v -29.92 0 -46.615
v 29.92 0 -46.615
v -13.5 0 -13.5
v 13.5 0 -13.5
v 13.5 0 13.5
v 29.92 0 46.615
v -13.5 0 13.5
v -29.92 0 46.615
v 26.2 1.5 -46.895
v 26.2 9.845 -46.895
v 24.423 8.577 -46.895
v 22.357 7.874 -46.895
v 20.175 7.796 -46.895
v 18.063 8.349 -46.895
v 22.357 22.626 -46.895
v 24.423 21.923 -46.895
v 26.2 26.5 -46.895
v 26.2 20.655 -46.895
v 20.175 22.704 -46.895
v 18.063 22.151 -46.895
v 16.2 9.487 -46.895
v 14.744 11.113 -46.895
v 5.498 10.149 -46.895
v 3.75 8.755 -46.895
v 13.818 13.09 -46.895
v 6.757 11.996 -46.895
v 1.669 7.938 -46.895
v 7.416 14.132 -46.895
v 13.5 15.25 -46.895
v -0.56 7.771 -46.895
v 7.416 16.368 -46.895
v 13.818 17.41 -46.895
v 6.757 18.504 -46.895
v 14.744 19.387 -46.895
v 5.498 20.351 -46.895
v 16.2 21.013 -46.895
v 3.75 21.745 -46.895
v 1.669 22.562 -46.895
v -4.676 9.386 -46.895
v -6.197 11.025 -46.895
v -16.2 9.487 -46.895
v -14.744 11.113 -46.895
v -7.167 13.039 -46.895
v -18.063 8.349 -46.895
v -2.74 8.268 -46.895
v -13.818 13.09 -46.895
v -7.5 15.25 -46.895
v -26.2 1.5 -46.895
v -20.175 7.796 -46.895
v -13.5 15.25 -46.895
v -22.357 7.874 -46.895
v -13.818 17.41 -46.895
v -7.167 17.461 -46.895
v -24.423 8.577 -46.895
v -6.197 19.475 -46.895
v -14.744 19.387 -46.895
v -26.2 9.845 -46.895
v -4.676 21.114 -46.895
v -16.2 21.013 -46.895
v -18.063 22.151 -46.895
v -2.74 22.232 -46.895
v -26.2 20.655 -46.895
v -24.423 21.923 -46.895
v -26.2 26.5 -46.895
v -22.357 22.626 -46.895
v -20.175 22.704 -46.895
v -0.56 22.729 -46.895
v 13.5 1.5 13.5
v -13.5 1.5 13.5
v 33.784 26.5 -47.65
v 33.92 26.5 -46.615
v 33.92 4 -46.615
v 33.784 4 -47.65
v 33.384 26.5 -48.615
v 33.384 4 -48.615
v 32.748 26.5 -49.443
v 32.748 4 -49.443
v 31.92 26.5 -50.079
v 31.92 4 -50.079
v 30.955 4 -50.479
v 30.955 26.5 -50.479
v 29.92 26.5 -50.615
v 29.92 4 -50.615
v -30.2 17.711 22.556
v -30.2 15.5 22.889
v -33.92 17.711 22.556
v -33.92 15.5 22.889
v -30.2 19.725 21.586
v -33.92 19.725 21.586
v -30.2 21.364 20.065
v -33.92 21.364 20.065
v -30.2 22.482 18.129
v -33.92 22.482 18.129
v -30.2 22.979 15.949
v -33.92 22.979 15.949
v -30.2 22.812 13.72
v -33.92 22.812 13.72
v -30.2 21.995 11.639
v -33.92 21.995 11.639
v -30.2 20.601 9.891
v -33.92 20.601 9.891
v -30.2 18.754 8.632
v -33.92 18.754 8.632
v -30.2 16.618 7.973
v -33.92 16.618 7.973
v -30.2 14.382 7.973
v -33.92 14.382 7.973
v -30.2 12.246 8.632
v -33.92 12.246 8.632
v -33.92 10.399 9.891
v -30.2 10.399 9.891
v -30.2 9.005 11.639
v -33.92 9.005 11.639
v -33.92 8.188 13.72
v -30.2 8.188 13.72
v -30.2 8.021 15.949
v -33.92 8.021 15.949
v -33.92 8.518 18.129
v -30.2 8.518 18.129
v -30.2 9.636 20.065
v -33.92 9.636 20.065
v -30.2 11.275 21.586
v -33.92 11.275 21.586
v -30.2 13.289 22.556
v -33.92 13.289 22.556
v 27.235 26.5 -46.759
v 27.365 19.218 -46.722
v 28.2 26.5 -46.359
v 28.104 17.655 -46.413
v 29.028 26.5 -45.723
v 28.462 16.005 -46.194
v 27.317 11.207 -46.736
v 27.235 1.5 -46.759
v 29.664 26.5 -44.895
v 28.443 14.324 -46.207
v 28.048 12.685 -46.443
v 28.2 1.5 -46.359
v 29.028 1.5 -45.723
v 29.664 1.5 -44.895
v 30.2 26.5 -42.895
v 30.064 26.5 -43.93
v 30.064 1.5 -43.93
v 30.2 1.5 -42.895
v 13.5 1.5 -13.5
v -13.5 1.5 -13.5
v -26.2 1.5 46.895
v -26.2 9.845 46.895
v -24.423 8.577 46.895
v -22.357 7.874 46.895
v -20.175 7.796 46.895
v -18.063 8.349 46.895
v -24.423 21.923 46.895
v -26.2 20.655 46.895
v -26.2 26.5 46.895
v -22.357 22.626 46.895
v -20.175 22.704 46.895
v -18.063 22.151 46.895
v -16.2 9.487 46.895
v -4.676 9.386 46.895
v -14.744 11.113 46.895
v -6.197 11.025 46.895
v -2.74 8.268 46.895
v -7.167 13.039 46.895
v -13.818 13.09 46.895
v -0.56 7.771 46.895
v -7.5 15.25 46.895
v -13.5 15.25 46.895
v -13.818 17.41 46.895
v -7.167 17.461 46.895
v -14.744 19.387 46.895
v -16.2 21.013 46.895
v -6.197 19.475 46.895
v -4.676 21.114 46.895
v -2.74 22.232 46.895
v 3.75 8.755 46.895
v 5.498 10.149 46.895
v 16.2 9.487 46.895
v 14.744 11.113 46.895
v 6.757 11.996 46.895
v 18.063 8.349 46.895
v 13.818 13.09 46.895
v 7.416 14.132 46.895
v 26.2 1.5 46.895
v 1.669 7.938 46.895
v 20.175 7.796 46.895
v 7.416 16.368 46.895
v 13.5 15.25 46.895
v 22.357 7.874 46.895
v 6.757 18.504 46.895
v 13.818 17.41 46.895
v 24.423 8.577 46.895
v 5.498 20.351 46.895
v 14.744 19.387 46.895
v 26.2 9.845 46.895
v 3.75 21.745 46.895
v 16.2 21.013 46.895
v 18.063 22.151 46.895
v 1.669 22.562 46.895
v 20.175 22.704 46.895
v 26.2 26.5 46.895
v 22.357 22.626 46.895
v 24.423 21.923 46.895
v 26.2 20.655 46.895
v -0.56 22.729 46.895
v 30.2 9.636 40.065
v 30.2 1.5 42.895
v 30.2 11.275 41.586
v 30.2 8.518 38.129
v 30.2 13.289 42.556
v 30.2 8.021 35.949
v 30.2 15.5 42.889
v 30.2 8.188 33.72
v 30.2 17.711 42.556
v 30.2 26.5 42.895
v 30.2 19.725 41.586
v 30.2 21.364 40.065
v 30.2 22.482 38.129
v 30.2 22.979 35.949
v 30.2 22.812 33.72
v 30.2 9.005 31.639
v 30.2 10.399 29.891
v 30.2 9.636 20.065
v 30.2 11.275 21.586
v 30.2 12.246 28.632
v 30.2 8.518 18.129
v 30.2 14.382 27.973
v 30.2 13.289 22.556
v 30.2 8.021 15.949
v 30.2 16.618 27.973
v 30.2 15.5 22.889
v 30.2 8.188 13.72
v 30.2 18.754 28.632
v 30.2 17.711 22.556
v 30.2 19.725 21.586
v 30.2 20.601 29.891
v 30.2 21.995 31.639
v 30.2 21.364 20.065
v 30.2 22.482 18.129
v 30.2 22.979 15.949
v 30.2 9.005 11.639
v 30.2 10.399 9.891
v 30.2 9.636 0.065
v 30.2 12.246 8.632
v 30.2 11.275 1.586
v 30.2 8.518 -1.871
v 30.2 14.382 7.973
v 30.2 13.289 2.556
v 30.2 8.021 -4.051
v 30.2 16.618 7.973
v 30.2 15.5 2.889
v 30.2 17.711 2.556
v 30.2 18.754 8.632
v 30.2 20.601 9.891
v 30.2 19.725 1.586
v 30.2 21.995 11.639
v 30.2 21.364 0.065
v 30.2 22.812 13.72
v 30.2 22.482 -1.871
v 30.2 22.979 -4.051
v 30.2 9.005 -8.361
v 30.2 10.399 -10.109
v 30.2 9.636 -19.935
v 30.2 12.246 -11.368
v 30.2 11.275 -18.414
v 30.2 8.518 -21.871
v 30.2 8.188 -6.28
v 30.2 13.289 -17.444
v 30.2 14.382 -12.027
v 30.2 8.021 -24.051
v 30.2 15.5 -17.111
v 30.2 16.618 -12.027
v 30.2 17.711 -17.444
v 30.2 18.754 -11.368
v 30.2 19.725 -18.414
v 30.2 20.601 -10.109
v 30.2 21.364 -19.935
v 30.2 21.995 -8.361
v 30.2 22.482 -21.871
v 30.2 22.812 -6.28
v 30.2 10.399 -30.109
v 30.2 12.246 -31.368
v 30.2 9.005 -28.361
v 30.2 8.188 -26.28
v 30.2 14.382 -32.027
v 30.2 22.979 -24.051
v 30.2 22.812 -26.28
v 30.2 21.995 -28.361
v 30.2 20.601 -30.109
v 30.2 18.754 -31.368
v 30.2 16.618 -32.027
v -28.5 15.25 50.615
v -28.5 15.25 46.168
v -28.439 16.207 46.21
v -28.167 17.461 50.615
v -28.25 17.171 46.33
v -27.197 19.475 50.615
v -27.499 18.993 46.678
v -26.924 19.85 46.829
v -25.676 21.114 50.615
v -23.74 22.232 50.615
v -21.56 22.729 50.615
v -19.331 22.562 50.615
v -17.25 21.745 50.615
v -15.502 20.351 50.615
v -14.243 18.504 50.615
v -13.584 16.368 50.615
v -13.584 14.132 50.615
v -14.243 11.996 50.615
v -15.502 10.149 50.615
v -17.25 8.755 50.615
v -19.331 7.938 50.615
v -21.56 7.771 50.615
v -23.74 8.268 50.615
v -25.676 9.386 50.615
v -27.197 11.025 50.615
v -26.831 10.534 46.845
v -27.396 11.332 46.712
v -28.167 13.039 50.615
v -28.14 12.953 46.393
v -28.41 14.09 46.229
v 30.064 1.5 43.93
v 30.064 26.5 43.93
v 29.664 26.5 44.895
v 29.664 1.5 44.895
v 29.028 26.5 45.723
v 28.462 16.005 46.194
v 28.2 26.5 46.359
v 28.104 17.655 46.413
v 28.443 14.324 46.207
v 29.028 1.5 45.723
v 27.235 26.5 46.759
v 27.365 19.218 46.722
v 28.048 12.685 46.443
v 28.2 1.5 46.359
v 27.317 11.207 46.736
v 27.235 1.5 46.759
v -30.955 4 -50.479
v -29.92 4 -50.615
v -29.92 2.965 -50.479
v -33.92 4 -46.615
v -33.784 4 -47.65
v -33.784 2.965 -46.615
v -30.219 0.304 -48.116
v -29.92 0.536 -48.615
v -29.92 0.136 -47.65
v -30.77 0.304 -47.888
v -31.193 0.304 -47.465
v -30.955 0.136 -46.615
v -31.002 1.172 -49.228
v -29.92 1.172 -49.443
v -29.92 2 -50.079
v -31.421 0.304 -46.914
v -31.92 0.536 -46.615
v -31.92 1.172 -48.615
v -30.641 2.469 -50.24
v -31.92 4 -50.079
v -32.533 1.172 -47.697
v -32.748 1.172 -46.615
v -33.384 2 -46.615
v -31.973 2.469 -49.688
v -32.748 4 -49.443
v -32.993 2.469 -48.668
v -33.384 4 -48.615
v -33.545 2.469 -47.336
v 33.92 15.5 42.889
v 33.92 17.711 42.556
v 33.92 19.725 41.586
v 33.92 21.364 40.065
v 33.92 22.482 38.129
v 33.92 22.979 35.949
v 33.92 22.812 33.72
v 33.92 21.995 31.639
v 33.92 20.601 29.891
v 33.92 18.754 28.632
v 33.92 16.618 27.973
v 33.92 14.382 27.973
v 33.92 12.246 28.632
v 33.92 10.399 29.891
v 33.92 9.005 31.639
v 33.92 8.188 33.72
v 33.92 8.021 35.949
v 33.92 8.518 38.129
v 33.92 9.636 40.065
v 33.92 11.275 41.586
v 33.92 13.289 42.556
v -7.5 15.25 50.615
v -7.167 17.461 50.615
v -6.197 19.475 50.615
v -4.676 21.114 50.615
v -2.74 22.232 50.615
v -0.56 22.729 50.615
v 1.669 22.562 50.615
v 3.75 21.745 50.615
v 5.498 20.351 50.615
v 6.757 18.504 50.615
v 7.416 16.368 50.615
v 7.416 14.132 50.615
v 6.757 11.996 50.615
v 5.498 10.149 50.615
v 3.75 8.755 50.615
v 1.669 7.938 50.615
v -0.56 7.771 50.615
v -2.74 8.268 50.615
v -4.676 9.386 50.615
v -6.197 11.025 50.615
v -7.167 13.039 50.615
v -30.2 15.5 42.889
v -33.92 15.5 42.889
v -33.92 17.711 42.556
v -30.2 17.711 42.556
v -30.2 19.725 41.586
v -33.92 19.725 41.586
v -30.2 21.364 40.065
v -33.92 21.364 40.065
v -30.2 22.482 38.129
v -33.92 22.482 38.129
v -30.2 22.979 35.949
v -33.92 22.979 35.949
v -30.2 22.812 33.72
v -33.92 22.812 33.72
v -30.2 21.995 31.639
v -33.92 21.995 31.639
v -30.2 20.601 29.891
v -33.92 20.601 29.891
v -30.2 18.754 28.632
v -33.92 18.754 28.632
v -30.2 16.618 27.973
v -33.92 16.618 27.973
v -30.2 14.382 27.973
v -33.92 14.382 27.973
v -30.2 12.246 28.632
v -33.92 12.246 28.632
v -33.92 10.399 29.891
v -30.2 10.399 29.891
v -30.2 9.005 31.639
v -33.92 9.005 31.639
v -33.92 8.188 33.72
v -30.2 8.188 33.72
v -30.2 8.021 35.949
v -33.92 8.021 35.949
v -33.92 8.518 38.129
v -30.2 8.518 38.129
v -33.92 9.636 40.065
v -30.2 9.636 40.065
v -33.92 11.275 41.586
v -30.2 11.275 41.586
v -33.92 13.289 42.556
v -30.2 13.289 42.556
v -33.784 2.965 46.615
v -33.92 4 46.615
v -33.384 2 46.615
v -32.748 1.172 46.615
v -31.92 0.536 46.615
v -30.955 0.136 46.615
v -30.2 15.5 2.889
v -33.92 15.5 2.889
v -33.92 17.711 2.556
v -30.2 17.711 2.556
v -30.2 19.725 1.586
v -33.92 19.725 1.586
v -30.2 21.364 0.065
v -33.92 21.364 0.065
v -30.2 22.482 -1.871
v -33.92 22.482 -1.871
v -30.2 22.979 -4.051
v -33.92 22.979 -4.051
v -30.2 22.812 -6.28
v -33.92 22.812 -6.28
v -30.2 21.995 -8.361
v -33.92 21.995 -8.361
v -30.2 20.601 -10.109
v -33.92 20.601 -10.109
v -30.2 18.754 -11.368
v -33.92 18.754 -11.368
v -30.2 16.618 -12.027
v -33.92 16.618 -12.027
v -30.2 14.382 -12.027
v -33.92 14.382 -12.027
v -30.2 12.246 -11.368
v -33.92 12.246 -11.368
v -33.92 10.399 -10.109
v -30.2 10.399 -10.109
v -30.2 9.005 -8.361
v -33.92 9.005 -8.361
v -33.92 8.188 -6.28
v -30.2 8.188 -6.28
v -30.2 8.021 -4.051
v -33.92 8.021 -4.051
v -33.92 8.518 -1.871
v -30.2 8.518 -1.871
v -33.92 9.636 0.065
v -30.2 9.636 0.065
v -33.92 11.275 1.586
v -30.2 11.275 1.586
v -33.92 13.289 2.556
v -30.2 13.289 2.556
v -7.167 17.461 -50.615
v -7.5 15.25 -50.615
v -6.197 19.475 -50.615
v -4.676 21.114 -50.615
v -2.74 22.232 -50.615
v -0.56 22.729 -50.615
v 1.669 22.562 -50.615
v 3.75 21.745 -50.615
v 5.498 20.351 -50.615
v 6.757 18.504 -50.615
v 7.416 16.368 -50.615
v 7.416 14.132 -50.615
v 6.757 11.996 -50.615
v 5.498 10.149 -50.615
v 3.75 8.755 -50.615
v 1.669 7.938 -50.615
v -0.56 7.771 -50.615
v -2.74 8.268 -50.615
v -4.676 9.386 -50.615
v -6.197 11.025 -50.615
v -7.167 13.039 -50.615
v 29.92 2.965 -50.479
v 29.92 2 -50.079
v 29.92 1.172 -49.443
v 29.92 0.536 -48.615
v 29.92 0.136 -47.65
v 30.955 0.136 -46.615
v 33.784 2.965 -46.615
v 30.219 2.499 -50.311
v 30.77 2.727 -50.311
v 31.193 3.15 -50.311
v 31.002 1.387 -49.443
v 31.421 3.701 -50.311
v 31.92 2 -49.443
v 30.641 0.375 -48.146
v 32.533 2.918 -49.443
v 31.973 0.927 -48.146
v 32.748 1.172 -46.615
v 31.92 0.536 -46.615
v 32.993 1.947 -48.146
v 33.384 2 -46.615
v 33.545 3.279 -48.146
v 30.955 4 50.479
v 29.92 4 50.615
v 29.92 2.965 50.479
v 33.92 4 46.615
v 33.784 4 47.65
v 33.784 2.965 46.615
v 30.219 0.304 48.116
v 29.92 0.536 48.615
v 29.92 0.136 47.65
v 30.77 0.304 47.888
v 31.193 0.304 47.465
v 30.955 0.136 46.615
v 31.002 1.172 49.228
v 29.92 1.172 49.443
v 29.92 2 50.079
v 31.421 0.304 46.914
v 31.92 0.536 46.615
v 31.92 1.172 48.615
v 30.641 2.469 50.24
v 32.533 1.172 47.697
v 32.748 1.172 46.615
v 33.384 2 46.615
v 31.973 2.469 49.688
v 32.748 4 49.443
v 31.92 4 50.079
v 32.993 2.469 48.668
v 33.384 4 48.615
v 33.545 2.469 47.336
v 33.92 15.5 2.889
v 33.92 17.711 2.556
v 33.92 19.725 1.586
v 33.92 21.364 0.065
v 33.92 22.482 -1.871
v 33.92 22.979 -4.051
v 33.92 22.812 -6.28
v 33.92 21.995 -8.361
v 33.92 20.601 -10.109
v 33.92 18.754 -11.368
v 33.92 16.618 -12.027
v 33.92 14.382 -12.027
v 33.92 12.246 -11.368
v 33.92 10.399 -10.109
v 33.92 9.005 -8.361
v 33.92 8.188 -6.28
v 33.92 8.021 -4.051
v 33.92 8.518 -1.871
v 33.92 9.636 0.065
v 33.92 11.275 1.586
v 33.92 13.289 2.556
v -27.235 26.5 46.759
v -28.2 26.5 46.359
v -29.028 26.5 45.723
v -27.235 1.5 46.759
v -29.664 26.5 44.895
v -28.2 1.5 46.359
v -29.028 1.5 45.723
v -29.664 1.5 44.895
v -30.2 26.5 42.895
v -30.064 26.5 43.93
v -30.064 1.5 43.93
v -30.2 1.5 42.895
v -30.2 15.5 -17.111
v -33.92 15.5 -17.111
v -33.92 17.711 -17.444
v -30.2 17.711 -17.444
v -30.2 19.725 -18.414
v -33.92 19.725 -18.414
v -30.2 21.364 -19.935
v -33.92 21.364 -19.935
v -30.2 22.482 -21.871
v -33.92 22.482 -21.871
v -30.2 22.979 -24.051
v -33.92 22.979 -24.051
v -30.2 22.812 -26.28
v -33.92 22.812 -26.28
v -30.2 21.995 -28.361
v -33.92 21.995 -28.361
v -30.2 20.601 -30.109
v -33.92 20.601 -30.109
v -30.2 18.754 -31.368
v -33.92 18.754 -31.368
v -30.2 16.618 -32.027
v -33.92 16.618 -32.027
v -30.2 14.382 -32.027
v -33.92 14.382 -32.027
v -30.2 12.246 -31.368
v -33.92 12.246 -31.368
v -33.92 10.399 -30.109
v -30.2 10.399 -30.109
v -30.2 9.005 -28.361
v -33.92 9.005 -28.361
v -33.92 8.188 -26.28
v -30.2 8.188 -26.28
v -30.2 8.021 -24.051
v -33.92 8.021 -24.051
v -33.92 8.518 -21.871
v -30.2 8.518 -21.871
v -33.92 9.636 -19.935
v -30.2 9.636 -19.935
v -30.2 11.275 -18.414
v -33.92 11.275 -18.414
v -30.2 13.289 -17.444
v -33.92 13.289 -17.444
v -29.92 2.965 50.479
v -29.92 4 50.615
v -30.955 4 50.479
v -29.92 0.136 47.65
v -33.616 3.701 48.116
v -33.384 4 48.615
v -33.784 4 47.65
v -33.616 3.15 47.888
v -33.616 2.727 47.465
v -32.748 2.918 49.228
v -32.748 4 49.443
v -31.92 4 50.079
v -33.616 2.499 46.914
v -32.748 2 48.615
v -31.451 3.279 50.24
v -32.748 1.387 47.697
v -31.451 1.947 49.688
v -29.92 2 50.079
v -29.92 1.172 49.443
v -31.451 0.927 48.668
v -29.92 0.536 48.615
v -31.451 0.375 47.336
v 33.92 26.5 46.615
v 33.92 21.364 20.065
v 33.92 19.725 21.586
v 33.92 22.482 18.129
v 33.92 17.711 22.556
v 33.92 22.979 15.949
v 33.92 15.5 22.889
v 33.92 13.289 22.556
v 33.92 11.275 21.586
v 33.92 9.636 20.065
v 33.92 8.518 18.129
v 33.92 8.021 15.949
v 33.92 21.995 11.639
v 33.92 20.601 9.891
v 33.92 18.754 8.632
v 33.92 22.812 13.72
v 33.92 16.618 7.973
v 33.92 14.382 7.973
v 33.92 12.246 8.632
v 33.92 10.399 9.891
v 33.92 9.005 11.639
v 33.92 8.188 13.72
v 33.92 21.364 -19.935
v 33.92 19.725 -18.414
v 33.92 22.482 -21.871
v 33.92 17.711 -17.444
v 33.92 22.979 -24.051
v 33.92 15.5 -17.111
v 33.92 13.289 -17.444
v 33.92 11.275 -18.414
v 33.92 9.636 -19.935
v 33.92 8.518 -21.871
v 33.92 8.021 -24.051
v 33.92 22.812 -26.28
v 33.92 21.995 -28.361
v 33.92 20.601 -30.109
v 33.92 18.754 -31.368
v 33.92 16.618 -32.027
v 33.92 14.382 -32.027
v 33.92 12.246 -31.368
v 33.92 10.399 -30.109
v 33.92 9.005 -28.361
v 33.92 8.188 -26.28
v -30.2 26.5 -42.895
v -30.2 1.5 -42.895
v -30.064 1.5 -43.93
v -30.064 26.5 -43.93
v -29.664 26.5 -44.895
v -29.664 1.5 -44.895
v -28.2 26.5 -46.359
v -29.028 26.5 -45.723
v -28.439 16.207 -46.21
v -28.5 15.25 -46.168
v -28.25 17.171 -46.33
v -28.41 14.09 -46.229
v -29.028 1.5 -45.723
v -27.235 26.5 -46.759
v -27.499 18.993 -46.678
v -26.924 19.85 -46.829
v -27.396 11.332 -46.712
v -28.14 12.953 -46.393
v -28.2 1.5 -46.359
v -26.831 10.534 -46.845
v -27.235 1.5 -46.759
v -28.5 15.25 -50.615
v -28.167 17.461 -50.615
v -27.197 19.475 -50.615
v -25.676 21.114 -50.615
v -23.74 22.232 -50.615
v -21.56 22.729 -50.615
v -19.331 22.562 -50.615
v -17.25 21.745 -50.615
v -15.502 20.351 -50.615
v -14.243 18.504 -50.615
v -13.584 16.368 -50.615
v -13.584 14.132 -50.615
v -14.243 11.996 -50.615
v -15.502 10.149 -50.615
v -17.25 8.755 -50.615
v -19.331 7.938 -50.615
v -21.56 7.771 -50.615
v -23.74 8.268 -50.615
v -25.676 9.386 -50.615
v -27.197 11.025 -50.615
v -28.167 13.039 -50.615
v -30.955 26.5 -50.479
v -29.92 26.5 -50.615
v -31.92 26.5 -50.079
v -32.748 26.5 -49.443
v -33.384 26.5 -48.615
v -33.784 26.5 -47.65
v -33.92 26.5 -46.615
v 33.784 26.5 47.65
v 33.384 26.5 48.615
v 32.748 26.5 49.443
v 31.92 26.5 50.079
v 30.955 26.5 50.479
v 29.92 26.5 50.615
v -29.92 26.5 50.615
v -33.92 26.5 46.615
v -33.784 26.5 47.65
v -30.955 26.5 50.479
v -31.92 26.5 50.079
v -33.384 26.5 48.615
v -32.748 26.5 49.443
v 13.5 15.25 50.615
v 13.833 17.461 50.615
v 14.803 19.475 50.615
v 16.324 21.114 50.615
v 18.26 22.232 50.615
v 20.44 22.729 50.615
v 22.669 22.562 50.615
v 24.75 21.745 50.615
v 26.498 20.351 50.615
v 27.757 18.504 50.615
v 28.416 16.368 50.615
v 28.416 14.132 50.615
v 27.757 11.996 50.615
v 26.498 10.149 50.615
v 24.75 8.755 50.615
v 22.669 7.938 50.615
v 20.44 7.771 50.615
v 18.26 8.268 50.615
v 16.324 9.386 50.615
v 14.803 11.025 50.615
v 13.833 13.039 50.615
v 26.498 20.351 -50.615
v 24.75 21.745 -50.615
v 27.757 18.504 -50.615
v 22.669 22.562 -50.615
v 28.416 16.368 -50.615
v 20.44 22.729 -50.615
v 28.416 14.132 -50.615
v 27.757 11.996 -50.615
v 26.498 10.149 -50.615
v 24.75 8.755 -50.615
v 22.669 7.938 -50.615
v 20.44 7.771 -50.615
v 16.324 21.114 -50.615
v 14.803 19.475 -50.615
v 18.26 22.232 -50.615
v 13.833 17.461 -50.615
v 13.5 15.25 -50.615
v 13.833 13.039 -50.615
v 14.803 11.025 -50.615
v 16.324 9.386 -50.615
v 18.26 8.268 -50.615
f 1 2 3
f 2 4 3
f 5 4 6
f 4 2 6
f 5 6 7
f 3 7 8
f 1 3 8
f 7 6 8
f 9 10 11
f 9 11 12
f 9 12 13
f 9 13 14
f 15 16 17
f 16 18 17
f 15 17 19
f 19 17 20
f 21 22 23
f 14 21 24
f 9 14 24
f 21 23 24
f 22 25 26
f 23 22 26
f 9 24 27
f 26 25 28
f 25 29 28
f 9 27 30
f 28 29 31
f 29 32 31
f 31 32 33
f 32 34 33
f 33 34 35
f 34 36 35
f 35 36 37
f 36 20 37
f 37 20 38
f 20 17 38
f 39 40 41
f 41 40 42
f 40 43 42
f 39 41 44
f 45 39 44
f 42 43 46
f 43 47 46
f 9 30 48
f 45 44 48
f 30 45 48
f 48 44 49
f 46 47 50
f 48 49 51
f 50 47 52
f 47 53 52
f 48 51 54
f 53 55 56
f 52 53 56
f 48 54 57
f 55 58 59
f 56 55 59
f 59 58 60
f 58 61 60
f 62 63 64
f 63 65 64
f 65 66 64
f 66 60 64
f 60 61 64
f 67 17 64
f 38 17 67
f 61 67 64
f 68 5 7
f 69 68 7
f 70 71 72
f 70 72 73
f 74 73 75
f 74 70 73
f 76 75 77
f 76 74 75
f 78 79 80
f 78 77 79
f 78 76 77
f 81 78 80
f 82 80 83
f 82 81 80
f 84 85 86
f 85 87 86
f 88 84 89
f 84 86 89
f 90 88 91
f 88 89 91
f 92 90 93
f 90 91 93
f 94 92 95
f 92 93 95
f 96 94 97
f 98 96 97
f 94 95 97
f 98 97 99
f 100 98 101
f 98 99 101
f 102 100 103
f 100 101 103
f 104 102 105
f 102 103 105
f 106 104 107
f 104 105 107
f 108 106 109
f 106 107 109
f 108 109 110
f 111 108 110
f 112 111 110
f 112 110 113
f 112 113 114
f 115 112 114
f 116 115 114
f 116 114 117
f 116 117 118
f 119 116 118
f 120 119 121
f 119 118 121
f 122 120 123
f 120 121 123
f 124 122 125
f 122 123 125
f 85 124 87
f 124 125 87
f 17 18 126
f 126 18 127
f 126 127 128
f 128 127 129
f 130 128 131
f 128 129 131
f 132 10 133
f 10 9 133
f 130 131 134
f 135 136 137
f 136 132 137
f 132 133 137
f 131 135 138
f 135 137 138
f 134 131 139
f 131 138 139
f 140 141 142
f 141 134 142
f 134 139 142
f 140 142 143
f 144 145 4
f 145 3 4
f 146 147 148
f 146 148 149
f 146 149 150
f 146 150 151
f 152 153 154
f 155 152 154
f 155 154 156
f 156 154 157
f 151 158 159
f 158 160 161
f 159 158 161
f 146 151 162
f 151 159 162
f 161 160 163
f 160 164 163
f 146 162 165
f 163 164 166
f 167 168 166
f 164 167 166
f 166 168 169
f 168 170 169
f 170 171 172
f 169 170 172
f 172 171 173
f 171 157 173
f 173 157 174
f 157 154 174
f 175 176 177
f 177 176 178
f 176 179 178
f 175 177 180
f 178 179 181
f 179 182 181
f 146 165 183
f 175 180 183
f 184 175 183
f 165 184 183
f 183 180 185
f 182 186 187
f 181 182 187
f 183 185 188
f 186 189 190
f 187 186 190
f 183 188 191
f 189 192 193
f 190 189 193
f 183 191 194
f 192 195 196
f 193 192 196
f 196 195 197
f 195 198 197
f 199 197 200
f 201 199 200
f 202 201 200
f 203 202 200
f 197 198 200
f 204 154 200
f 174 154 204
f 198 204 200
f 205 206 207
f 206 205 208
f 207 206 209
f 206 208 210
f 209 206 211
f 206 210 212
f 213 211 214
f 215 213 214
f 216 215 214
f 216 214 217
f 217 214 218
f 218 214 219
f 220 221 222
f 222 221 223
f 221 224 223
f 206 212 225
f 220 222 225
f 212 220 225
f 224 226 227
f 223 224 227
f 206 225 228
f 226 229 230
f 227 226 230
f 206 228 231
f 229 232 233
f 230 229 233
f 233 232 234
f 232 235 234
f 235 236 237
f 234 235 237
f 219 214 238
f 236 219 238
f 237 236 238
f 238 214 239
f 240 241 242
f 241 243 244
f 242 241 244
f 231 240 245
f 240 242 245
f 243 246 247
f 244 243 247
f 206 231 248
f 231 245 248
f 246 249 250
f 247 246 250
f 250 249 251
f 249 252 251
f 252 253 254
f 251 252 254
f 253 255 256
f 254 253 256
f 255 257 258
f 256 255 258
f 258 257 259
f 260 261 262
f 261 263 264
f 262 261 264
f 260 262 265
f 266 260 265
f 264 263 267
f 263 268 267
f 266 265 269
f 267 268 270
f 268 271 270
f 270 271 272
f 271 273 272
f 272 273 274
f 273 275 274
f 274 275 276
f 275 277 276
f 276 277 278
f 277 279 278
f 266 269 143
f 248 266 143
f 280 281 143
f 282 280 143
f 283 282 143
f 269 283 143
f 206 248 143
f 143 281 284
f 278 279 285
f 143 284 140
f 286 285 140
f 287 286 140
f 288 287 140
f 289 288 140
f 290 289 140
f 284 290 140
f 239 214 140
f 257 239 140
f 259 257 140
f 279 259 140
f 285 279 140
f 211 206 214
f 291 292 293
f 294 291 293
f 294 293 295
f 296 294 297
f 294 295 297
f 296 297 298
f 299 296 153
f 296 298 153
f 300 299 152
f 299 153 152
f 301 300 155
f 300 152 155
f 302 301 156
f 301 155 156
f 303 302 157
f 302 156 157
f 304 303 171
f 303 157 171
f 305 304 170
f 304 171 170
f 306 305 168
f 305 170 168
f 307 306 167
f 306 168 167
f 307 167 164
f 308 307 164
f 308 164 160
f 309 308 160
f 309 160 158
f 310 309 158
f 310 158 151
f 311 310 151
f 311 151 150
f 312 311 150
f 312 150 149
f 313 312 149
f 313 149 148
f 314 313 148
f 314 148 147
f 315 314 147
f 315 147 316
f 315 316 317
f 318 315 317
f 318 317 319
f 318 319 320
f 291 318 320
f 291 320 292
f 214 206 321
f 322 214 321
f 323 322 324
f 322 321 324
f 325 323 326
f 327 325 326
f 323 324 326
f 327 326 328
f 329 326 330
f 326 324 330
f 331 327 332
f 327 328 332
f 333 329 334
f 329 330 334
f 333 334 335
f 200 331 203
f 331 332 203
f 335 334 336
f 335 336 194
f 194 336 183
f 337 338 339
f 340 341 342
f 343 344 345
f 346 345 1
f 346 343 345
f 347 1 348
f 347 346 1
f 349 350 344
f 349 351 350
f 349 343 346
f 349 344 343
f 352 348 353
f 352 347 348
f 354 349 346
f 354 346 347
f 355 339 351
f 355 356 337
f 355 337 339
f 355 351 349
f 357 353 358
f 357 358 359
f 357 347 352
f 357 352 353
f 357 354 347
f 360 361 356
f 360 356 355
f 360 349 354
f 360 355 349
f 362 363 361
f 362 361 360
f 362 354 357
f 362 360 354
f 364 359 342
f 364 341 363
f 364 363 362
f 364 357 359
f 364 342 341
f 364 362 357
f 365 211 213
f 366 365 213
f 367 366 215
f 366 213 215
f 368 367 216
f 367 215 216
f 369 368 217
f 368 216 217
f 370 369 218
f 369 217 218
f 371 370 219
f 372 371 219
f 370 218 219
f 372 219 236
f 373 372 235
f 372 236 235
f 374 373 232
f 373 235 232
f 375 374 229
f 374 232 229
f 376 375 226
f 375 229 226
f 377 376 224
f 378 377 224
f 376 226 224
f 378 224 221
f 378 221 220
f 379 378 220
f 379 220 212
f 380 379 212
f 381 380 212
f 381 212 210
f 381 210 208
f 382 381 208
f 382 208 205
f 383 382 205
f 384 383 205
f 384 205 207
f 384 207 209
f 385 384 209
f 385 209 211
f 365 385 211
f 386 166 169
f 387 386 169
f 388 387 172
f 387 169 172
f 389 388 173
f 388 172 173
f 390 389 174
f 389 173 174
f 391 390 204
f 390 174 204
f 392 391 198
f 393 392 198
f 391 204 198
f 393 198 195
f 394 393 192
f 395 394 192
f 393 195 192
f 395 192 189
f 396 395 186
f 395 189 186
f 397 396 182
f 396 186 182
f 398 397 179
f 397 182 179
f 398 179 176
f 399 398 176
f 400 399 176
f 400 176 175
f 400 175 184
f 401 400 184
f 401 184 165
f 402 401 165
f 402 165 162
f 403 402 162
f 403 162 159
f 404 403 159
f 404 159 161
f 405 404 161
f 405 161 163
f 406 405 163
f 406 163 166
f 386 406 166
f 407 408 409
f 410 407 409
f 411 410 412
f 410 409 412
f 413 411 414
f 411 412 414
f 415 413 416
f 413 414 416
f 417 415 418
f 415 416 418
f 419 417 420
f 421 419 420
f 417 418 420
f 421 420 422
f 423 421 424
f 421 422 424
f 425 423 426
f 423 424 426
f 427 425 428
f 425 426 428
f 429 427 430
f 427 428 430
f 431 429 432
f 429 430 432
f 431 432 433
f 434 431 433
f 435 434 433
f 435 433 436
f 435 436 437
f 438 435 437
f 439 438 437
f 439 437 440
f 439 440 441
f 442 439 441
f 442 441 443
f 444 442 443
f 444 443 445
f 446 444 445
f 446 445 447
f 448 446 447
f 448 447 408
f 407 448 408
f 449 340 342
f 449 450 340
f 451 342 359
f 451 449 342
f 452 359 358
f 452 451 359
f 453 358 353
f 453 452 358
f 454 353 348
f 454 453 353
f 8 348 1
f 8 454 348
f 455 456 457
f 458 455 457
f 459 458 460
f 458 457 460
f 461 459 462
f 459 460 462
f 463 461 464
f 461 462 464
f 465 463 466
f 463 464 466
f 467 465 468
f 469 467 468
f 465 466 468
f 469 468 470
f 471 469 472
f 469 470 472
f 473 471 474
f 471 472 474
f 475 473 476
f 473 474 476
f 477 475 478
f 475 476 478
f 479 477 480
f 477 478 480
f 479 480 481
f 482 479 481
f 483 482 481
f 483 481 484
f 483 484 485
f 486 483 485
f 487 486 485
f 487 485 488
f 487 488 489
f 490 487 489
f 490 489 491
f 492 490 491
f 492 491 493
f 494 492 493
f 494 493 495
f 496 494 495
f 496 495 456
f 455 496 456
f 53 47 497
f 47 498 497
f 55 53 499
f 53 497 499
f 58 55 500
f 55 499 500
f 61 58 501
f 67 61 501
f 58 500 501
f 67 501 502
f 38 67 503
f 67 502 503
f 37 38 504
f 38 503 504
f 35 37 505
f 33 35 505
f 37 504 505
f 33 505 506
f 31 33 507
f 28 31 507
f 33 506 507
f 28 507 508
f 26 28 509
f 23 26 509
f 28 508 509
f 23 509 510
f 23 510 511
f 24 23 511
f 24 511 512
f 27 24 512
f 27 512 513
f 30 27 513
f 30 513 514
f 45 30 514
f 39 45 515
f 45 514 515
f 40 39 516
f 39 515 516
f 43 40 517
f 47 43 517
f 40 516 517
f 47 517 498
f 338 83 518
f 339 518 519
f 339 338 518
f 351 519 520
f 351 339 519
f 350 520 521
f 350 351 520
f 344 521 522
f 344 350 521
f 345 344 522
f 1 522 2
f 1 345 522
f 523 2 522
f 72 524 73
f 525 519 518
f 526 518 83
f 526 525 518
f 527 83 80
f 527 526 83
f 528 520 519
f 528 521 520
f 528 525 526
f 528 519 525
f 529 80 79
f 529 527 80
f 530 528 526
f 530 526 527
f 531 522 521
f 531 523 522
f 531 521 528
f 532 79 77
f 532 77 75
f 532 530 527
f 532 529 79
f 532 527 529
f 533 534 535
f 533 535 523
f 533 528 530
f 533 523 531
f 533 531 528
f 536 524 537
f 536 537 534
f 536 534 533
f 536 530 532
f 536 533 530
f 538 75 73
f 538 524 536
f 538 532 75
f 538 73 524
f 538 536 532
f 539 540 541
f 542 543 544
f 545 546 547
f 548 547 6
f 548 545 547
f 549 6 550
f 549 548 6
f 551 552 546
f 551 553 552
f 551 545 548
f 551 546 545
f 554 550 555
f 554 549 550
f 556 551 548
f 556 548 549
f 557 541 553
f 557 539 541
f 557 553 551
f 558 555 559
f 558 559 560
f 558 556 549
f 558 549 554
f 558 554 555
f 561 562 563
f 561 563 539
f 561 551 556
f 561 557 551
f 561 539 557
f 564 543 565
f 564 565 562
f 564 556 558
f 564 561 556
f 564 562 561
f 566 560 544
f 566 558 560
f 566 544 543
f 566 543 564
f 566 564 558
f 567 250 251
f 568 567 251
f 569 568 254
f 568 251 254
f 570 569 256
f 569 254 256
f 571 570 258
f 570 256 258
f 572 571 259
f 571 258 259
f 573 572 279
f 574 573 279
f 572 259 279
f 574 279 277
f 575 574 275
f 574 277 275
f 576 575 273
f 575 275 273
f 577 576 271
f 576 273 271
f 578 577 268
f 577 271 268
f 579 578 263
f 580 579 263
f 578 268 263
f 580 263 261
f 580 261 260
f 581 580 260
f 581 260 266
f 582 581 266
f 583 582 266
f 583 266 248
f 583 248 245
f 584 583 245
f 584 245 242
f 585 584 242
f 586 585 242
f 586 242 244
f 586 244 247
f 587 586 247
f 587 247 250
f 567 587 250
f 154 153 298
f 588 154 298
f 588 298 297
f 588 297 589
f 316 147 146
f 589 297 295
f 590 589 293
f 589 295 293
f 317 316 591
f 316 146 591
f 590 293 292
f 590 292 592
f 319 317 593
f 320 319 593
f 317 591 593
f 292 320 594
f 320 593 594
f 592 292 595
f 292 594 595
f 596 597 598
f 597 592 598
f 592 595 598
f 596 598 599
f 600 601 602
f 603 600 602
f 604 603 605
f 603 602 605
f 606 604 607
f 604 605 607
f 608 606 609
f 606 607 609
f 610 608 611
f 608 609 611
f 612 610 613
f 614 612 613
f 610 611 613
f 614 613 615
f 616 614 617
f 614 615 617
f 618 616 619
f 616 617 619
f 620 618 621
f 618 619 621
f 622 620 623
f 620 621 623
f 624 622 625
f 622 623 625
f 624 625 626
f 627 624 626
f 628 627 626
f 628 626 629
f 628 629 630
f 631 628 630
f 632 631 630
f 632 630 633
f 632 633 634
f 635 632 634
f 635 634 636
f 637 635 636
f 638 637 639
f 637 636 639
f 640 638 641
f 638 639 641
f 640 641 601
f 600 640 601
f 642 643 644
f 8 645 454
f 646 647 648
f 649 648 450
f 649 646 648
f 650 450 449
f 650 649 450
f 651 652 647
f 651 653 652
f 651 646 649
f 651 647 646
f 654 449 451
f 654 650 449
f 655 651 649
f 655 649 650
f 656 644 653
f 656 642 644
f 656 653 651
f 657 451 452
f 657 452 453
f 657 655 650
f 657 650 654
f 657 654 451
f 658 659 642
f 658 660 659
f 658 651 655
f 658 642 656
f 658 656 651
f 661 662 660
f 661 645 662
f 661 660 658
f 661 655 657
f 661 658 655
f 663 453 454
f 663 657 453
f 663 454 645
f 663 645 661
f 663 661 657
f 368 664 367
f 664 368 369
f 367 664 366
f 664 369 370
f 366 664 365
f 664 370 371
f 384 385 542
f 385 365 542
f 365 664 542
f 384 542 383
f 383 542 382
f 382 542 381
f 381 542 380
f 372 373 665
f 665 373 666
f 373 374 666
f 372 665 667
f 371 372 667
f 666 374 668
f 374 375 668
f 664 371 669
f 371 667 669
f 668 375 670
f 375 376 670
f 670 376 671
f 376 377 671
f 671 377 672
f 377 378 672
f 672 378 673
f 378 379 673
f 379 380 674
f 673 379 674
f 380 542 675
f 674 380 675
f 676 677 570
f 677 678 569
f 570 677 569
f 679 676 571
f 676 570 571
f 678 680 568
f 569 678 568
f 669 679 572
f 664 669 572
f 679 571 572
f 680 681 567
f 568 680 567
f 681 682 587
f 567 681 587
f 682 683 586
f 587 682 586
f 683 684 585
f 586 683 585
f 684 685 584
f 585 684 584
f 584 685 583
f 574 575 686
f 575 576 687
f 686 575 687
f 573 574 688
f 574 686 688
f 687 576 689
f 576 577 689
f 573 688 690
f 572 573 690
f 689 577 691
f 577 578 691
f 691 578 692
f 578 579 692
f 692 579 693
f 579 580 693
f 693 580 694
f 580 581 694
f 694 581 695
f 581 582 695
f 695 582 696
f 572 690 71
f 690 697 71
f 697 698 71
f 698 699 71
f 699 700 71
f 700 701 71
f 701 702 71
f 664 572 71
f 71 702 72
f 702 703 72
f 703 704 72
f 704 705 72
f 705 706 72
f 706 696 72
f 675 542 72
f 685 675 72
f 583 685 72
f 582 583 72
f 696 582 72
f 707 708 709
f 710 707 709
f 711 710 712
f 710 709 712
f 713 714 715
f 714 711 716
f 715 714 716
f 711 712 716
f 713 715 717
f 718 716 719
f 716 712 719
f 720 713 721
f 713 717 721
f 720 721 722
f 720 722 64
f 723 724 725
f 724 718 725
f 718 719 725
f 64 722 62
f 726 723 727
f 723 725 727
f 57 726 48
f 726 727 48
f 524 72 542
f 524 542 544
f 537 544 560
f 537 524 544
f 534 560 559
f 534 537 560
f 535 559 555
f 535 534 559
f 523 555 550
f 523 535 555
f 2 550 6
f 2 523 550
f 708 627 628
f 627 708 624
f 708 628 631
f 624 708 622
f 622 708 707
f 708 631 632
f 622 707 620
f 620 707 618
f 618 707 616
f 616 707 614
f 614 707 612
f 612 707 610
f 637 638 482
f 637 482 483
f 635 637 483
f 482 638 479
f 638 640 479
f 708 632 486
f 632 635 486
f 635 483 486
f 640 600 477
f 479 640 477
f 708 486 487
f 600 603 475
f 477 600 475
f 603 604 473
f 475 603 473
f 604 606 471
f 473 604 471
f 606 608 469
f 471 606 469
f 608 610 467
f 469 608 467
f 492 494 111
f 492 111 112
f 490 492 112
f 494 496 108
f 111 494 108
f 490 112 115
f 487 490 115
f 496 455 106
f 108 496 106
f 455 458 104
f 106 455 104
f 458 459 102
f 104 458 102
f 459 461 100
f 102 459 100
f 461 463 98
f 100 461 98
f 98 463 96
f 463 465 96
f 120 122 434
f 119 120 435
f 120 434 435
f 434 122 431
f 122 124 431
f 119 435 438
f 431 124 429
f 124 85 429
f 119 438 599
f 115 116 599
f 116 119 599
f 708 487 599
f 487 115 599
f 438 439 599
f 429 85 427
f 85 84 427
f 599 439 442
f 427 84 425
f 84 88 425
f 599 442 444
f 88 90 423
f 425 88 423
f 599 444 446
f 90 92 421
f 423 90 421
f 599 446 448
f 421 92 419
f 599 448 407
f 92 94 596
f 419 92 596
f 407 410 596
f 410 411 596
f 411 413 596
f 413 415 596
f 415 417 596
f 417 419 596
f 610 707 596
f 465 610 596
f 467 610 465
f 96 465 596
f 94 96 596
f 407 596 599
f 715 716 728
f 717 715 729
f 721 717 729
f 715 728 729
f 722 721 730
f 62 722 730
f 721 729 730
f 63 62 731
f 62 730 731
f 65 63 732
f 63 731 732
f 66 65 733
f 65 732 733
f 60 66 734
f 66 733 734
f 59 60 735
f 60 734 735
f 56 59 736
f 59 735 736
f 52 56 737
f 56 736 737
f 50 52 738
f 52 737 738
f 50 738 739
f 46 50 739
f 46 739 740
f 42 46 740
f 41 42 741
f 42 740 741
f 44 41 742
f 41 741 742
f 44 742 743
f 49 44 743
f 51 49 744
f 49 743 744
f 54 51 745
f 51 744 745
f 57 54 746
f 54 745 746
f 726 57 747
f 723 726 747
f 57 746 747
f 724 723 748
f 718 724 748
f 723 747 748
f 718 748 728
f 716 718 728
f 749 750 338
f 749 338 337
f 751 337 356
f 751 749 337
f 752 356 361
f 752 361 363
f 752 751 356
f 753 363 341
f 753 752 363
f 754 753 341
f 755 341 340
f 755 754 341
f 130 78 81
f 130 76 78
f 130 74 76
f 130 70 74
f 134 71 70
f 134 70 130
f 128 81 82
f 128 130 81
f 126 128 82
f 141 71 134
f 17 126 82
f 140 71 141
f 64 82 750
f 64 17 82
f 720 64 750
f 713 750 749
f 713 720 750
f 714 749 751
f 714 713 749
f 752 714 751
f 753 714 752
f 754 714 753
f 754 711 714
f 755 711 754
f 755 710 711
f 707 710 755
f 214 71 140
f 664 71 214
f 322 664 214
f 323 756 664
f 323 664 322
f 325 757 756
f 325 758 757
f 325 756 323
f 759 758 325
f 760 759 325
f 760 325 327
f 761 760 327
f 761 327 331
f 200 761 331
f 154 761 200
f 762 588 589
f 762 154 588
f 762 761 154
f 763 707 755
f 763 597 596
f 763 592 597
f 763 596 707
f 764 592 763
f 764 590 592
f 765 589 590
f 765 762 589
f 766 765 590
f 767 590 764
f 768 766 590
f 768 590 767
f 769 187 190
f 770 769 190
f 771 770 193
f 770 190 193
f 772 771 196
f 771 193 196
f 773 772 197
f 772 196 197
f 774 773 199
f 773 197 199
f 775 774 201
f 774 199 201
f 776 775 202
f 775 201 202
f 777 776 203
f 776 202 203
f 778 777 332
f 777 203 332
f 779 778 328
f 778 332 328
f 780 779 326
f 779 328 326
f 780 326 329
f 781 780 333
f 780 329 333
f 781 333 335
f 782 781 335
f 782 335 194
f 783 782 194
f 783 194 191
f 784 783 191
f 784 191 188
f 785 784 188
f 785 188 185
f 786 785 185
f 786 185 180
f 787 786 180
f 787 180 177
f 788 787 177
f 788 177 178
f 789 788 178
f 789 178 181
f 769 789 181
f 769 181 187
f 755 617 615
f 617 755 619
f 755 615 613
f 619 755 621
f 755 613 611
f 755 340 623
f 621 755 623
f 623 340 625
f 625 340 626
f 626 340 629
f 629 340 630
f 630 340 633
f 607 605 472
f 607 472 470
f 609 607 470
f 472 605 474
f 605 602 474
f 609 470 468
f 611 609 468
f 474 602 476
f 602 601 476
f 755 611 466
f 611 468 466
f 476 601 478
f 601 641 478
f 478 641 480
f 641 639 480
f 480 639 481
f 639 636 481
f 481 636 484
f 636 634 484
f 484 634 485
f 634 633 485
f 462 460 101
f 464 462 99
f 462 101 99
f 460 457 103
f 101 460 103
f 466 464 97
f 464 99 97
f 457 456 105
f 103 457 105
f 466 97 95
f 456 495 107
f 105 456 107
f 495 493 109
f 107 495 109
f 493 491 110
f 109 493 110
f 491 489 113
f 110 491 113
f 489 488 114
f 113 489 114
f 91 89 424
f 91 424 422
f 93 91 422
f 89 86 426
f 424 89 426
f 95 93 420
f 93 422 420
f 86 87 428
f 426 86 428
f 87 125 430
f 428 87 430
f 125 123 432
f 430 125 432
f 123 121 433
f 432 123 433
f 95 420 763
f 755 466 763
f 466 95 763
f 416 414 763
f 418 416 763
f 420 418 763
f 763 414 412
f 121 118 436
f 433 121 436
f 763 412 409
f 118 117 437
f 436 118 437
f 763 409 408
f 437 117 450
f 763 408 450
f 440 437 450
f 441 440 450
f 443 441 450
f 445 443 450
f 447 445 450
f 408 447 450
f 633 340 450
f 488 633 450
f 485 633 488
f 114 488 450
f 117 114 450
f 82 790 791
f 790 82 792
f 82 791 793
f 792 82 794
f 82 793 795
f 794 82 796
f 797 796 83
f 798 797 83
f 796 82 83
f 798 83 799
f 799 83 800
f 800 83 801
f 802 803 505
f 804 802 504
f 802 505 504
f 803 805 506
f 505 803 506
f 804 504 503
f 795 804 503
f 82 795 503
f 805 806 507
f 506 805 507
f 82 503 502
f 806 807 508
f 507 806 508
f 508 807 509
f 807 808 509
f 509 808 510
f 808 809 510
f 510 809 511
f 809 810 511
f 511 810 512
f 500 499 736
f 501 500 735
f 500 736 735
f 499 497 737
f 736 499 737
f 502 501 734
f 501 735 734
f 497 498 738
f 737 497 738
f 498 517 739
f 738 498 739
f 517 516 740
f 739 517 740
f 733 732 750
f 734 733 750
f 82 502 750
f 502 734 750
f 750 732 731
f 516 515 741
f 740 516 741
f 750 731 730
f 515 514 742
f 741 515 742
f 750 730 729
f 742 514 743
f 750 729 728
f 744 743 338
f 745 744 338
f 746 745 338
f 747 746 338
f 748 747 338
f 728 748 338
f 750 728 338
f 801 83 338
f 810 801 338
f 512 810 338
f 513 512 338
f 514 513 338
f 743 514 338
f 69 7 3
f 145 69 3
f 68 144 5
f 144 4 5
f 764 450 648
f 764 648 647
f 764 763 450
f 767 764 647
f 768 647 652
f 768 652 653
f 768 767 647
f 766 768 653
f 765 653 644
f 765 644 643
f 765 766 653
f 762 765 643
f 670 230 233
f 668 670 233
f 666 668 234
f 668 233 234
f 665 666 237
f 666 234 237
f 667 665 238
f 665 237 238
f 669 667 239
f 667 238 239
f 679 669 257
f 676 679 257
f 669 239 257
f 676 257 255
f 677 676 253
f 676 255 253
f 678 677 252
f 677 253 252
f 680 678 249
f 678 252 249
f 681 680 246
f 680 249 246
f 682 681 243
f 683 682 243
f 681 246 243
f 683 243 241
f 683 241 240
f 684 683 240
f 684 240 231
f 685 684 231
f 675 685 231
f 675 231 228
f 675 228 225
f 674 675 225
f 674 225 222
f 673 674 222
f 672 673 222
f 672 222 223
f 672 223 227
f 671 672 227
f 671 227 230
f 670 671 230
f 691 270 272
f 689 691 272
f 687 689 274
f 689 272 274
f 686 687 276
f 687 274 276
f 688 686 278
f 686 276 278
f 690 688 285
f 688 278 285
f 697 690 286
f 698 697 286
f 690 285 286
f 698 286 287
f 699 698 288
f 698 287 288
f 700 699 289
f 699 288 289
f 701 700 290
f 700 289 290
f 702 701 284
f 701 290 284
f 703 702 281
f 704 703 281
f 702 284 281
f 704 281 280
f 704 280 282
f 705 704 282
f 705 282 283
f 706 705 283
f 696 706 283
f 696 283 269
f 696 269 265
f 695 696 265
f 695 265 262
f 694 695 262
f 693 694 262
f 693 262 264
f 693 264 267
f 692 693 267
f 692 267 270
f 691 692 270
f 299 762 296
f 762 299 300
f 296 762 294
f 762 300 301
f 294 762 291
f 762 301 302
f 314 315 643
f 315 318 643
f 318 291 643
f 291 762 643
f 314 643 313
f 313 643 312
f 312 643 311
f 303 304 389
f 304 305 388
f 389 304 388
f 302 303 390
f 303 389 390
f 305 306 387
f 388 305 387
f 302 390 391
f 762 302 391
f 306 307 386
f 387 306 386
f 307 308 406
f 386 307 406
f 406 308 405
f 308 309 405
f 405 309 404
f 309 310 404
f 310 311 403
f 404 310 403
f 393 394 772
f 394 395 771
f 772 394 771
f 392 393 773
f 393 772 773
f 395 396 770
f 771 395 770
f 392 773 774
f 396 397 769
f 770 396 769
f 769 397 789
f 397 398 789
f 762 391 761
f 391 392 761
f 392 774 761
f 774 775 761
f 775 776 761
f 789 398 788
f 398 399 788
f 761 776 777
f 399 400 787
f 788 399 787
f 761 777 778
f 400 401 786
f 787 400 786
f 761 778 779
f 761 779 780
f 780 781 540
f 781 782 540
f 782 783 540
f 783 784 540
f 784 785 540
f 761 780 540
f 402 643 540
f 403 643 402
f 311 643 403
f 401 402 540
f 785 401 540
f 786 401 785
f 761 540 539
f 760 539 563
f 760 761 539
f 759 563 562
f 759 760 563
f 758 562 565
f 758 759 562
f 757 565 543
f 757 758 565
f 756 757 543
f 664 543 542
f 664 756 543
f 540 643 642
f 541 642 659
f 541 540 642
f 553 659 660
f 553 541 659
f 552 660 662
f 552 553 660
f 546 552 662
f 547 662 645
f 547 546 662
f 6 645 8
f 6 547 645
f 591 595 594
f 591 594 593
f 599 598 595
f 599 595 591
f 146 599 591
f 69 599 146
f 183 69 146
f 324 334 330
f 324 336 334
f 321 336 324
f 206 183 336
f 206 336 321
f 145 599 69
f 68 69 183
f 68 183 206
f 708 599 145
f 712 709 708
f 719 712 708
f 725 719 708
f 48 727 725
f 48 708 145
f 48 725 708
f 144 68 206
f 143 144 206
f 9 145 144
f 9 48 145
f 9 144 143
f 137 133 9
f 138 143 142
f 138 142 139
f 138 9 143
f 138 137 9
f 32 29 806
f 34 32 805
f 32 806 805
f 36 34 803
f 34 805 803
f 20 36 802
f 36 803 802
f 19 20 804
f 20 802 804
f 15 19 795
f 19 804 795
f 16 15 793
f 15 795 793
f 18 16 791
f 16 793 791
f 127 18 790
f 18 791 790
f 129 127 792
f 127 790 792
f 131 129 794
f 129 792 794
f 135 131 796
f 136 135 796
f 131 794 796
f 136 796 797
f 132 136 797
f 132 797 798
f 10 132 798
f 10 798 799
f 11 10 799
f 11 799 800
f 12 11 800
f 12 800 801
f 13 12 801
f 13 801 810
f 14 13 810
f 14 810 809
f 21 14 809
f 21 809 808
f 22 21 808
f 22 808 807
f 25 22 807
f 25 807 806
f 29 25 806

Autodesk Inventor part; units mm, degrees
ref_plane "YZ Plane" through (0, 0, 0) normal (1, 0, 0) x (0, 1, 0)
ref_plane "XZ Plane" through (0, 0, 0) normal (0, 1, 0) x (-1, 0, 0)
ref_plane "XY Plane" through (0, 0, 0) normal (0, 0, 1) x (1, 0, 0)
sketch "Sketch1" plane through (0, 0, 0) normal (0, 1, 0) x (-1, 0, 0)
  line L0 (33.92, 50.615) -> (-33.92, 50.615)
  line L1 (-33.92, 50.615) -> (-33.92, -50.615)
  line L2 (-33.92, -50.615) -> (33.92, -50.615)
  line L3 (33.92, -50.615) -> (33.92, 50.615)
  line L4 (33.92, 50.615) -> (-33.92, -50.615) construction
  line L5 (-33.92, 50.615) -> (33.92, -50.615) construction
  point P0 (0, 0)
  dimension "d0" = 67.84
  dimension "d1" = 101.23
extrude "Extrusion1" add sketch "Sketch1" along normal blind 26.5
fillet "Fillet1" radius 4 8 edges at (33.92, 13.25, 50.615) (33.92, 0, 0) (33.92, 13.25, -50.615) (-33.92, 13.25, -50.615) (0, 0, -50.615) (0, 0, 50.615) (-33.92, 13.25, 50.615) (-33.92, 0, 0)
sketch "Sketch2" plane through (0, 26.5, 0) normal (0, 1, 0) x (1, 0, 0)
  line L0 (30.2, 46.895) -> (-30.2, 46.895)
  line L1 (-30.2, 46.895) -> (-30.2, -46.895)
  line L2 (-30.2, -46.895) -> (30.2, -46.895)
  line L3 (30.2, -46.895) -> (30.2, 46.895)
  line L4 (30.2, 46.895) -> (-30.2, -46.895) construction
  line L5 (-30.2, 46.895) -> (30.2, -46.895) construction
  line L6 (-29.92, -50.615) -> (29.92, -50.615) projected
  line L7 (33.92, -46.615) -> (33.92, 46.615) projected
  point P0 (0, 0)
  dimension "d5" = 3.72
  dimension "d6" = 3.72
extrude "Extrusion2" cut sketch "Sketch2" against normal blind 25
fillet "Fillet2" radius 4 4 edges at (30.2, 14, -46.895) (30.2, 14, 46.895) (-30.2, 14, -46.895) (-30.2, 14, 46.895)
sketch "Sketch3" plane through (0, 0, 0) normal (0, -1, 0) x (1, 0, 0)
  line L0 (-13.5, -13.5) -> (13.5, -13.5)
  line L1 (13.5, -13.5) -> (13.5, 13.5)
  line L2 (13.5, 13.5) -> (-13.5, 13.5)
  line L3 (-13.5, 13.5) -> (-13.5, -13.5)
  line L4 (-13.5, -13.5) -> (13.5, 13.5) construction
  line L5 (13.5, -13.5) -> (-13.5, 13.5) construction
  point P0 (0, 0)
  dimension "d10" = 27
  dimension "d11" = 27
extrude "Extrusion4" cut sketch "Sketch3" against normal through all
sketch "Sketch4" plane through (-33.92, 4, 46.615) normal (-1, 0, 0) x (0, 0, 1)
  circle A0 centre (-11.226, 11.5) radius 7.5
  circle A1 centre (-31.226, 11.5) radius 7.5
  circle A2 centre (-51.226, 11.5) radius 7.5
  circle A3 centre (-71.226, 11.5) radius 7.5
  line L0 (0, 22.5) -> (0, 0) projected
  line L1 (-93.23, 22.5) -> (0, 22.5) projected
  point P0 (-46.615, -4)
  dimension "d17" = 15
  dimension "d18" = 15
  dimension "d19" = 20
  dimension "d20" = 15
  dimension "d21" = 15
  dimension "d22" = 20
  dimension "d23" = 20
  dimension "d24" = 11.226
  dimension "d25" = 11
  dimension "d26" = 11
  dimension "d27" = 11
  dimension "d28" = 11
extrude "Extrusion5" cut sketch "Sketch4" against normal through all
sketch "Sketch5" plane through (29.92, 4, -50.615) normal (0, 0, -1) x (-1, 0, 0)
  line L0 (59.84, 22.5) -> (59.84, 0) projected
  line L1 (0, 22.5) -> (59.84, 22.5) projected
  line L2 (59.84, 0) -> (0, 22.5) construction
  line L3 (59.84, 0) -> (0, 0) projected
  line L4 (59.84, 22.5) -> (0, 0) construction
  circle A0 centre (29.92, 11.25) radius 7.5
  circle A1 centre (50.92, 11.25) radius 7.5
  circle A2 centre (8.92, 11.25) radius 7.5
  line L5 (0, 0) -> (0, 22.5) projected
  point P0 (29.92, -4)
  dimension "d31" = 15
  dimension "d32" = 15
  dimension "d33" = 15
  dimension "d34" = 21
  dimension "d35" = 21
  dimension "d36" = 8.92
  dimension "d37" = 8.92
extrude "Extrusion6" cut sketch "Sketch5" against normal through all contours A0 | A1 | A2
properties part number "TopCover" material "ABS Plastic"
